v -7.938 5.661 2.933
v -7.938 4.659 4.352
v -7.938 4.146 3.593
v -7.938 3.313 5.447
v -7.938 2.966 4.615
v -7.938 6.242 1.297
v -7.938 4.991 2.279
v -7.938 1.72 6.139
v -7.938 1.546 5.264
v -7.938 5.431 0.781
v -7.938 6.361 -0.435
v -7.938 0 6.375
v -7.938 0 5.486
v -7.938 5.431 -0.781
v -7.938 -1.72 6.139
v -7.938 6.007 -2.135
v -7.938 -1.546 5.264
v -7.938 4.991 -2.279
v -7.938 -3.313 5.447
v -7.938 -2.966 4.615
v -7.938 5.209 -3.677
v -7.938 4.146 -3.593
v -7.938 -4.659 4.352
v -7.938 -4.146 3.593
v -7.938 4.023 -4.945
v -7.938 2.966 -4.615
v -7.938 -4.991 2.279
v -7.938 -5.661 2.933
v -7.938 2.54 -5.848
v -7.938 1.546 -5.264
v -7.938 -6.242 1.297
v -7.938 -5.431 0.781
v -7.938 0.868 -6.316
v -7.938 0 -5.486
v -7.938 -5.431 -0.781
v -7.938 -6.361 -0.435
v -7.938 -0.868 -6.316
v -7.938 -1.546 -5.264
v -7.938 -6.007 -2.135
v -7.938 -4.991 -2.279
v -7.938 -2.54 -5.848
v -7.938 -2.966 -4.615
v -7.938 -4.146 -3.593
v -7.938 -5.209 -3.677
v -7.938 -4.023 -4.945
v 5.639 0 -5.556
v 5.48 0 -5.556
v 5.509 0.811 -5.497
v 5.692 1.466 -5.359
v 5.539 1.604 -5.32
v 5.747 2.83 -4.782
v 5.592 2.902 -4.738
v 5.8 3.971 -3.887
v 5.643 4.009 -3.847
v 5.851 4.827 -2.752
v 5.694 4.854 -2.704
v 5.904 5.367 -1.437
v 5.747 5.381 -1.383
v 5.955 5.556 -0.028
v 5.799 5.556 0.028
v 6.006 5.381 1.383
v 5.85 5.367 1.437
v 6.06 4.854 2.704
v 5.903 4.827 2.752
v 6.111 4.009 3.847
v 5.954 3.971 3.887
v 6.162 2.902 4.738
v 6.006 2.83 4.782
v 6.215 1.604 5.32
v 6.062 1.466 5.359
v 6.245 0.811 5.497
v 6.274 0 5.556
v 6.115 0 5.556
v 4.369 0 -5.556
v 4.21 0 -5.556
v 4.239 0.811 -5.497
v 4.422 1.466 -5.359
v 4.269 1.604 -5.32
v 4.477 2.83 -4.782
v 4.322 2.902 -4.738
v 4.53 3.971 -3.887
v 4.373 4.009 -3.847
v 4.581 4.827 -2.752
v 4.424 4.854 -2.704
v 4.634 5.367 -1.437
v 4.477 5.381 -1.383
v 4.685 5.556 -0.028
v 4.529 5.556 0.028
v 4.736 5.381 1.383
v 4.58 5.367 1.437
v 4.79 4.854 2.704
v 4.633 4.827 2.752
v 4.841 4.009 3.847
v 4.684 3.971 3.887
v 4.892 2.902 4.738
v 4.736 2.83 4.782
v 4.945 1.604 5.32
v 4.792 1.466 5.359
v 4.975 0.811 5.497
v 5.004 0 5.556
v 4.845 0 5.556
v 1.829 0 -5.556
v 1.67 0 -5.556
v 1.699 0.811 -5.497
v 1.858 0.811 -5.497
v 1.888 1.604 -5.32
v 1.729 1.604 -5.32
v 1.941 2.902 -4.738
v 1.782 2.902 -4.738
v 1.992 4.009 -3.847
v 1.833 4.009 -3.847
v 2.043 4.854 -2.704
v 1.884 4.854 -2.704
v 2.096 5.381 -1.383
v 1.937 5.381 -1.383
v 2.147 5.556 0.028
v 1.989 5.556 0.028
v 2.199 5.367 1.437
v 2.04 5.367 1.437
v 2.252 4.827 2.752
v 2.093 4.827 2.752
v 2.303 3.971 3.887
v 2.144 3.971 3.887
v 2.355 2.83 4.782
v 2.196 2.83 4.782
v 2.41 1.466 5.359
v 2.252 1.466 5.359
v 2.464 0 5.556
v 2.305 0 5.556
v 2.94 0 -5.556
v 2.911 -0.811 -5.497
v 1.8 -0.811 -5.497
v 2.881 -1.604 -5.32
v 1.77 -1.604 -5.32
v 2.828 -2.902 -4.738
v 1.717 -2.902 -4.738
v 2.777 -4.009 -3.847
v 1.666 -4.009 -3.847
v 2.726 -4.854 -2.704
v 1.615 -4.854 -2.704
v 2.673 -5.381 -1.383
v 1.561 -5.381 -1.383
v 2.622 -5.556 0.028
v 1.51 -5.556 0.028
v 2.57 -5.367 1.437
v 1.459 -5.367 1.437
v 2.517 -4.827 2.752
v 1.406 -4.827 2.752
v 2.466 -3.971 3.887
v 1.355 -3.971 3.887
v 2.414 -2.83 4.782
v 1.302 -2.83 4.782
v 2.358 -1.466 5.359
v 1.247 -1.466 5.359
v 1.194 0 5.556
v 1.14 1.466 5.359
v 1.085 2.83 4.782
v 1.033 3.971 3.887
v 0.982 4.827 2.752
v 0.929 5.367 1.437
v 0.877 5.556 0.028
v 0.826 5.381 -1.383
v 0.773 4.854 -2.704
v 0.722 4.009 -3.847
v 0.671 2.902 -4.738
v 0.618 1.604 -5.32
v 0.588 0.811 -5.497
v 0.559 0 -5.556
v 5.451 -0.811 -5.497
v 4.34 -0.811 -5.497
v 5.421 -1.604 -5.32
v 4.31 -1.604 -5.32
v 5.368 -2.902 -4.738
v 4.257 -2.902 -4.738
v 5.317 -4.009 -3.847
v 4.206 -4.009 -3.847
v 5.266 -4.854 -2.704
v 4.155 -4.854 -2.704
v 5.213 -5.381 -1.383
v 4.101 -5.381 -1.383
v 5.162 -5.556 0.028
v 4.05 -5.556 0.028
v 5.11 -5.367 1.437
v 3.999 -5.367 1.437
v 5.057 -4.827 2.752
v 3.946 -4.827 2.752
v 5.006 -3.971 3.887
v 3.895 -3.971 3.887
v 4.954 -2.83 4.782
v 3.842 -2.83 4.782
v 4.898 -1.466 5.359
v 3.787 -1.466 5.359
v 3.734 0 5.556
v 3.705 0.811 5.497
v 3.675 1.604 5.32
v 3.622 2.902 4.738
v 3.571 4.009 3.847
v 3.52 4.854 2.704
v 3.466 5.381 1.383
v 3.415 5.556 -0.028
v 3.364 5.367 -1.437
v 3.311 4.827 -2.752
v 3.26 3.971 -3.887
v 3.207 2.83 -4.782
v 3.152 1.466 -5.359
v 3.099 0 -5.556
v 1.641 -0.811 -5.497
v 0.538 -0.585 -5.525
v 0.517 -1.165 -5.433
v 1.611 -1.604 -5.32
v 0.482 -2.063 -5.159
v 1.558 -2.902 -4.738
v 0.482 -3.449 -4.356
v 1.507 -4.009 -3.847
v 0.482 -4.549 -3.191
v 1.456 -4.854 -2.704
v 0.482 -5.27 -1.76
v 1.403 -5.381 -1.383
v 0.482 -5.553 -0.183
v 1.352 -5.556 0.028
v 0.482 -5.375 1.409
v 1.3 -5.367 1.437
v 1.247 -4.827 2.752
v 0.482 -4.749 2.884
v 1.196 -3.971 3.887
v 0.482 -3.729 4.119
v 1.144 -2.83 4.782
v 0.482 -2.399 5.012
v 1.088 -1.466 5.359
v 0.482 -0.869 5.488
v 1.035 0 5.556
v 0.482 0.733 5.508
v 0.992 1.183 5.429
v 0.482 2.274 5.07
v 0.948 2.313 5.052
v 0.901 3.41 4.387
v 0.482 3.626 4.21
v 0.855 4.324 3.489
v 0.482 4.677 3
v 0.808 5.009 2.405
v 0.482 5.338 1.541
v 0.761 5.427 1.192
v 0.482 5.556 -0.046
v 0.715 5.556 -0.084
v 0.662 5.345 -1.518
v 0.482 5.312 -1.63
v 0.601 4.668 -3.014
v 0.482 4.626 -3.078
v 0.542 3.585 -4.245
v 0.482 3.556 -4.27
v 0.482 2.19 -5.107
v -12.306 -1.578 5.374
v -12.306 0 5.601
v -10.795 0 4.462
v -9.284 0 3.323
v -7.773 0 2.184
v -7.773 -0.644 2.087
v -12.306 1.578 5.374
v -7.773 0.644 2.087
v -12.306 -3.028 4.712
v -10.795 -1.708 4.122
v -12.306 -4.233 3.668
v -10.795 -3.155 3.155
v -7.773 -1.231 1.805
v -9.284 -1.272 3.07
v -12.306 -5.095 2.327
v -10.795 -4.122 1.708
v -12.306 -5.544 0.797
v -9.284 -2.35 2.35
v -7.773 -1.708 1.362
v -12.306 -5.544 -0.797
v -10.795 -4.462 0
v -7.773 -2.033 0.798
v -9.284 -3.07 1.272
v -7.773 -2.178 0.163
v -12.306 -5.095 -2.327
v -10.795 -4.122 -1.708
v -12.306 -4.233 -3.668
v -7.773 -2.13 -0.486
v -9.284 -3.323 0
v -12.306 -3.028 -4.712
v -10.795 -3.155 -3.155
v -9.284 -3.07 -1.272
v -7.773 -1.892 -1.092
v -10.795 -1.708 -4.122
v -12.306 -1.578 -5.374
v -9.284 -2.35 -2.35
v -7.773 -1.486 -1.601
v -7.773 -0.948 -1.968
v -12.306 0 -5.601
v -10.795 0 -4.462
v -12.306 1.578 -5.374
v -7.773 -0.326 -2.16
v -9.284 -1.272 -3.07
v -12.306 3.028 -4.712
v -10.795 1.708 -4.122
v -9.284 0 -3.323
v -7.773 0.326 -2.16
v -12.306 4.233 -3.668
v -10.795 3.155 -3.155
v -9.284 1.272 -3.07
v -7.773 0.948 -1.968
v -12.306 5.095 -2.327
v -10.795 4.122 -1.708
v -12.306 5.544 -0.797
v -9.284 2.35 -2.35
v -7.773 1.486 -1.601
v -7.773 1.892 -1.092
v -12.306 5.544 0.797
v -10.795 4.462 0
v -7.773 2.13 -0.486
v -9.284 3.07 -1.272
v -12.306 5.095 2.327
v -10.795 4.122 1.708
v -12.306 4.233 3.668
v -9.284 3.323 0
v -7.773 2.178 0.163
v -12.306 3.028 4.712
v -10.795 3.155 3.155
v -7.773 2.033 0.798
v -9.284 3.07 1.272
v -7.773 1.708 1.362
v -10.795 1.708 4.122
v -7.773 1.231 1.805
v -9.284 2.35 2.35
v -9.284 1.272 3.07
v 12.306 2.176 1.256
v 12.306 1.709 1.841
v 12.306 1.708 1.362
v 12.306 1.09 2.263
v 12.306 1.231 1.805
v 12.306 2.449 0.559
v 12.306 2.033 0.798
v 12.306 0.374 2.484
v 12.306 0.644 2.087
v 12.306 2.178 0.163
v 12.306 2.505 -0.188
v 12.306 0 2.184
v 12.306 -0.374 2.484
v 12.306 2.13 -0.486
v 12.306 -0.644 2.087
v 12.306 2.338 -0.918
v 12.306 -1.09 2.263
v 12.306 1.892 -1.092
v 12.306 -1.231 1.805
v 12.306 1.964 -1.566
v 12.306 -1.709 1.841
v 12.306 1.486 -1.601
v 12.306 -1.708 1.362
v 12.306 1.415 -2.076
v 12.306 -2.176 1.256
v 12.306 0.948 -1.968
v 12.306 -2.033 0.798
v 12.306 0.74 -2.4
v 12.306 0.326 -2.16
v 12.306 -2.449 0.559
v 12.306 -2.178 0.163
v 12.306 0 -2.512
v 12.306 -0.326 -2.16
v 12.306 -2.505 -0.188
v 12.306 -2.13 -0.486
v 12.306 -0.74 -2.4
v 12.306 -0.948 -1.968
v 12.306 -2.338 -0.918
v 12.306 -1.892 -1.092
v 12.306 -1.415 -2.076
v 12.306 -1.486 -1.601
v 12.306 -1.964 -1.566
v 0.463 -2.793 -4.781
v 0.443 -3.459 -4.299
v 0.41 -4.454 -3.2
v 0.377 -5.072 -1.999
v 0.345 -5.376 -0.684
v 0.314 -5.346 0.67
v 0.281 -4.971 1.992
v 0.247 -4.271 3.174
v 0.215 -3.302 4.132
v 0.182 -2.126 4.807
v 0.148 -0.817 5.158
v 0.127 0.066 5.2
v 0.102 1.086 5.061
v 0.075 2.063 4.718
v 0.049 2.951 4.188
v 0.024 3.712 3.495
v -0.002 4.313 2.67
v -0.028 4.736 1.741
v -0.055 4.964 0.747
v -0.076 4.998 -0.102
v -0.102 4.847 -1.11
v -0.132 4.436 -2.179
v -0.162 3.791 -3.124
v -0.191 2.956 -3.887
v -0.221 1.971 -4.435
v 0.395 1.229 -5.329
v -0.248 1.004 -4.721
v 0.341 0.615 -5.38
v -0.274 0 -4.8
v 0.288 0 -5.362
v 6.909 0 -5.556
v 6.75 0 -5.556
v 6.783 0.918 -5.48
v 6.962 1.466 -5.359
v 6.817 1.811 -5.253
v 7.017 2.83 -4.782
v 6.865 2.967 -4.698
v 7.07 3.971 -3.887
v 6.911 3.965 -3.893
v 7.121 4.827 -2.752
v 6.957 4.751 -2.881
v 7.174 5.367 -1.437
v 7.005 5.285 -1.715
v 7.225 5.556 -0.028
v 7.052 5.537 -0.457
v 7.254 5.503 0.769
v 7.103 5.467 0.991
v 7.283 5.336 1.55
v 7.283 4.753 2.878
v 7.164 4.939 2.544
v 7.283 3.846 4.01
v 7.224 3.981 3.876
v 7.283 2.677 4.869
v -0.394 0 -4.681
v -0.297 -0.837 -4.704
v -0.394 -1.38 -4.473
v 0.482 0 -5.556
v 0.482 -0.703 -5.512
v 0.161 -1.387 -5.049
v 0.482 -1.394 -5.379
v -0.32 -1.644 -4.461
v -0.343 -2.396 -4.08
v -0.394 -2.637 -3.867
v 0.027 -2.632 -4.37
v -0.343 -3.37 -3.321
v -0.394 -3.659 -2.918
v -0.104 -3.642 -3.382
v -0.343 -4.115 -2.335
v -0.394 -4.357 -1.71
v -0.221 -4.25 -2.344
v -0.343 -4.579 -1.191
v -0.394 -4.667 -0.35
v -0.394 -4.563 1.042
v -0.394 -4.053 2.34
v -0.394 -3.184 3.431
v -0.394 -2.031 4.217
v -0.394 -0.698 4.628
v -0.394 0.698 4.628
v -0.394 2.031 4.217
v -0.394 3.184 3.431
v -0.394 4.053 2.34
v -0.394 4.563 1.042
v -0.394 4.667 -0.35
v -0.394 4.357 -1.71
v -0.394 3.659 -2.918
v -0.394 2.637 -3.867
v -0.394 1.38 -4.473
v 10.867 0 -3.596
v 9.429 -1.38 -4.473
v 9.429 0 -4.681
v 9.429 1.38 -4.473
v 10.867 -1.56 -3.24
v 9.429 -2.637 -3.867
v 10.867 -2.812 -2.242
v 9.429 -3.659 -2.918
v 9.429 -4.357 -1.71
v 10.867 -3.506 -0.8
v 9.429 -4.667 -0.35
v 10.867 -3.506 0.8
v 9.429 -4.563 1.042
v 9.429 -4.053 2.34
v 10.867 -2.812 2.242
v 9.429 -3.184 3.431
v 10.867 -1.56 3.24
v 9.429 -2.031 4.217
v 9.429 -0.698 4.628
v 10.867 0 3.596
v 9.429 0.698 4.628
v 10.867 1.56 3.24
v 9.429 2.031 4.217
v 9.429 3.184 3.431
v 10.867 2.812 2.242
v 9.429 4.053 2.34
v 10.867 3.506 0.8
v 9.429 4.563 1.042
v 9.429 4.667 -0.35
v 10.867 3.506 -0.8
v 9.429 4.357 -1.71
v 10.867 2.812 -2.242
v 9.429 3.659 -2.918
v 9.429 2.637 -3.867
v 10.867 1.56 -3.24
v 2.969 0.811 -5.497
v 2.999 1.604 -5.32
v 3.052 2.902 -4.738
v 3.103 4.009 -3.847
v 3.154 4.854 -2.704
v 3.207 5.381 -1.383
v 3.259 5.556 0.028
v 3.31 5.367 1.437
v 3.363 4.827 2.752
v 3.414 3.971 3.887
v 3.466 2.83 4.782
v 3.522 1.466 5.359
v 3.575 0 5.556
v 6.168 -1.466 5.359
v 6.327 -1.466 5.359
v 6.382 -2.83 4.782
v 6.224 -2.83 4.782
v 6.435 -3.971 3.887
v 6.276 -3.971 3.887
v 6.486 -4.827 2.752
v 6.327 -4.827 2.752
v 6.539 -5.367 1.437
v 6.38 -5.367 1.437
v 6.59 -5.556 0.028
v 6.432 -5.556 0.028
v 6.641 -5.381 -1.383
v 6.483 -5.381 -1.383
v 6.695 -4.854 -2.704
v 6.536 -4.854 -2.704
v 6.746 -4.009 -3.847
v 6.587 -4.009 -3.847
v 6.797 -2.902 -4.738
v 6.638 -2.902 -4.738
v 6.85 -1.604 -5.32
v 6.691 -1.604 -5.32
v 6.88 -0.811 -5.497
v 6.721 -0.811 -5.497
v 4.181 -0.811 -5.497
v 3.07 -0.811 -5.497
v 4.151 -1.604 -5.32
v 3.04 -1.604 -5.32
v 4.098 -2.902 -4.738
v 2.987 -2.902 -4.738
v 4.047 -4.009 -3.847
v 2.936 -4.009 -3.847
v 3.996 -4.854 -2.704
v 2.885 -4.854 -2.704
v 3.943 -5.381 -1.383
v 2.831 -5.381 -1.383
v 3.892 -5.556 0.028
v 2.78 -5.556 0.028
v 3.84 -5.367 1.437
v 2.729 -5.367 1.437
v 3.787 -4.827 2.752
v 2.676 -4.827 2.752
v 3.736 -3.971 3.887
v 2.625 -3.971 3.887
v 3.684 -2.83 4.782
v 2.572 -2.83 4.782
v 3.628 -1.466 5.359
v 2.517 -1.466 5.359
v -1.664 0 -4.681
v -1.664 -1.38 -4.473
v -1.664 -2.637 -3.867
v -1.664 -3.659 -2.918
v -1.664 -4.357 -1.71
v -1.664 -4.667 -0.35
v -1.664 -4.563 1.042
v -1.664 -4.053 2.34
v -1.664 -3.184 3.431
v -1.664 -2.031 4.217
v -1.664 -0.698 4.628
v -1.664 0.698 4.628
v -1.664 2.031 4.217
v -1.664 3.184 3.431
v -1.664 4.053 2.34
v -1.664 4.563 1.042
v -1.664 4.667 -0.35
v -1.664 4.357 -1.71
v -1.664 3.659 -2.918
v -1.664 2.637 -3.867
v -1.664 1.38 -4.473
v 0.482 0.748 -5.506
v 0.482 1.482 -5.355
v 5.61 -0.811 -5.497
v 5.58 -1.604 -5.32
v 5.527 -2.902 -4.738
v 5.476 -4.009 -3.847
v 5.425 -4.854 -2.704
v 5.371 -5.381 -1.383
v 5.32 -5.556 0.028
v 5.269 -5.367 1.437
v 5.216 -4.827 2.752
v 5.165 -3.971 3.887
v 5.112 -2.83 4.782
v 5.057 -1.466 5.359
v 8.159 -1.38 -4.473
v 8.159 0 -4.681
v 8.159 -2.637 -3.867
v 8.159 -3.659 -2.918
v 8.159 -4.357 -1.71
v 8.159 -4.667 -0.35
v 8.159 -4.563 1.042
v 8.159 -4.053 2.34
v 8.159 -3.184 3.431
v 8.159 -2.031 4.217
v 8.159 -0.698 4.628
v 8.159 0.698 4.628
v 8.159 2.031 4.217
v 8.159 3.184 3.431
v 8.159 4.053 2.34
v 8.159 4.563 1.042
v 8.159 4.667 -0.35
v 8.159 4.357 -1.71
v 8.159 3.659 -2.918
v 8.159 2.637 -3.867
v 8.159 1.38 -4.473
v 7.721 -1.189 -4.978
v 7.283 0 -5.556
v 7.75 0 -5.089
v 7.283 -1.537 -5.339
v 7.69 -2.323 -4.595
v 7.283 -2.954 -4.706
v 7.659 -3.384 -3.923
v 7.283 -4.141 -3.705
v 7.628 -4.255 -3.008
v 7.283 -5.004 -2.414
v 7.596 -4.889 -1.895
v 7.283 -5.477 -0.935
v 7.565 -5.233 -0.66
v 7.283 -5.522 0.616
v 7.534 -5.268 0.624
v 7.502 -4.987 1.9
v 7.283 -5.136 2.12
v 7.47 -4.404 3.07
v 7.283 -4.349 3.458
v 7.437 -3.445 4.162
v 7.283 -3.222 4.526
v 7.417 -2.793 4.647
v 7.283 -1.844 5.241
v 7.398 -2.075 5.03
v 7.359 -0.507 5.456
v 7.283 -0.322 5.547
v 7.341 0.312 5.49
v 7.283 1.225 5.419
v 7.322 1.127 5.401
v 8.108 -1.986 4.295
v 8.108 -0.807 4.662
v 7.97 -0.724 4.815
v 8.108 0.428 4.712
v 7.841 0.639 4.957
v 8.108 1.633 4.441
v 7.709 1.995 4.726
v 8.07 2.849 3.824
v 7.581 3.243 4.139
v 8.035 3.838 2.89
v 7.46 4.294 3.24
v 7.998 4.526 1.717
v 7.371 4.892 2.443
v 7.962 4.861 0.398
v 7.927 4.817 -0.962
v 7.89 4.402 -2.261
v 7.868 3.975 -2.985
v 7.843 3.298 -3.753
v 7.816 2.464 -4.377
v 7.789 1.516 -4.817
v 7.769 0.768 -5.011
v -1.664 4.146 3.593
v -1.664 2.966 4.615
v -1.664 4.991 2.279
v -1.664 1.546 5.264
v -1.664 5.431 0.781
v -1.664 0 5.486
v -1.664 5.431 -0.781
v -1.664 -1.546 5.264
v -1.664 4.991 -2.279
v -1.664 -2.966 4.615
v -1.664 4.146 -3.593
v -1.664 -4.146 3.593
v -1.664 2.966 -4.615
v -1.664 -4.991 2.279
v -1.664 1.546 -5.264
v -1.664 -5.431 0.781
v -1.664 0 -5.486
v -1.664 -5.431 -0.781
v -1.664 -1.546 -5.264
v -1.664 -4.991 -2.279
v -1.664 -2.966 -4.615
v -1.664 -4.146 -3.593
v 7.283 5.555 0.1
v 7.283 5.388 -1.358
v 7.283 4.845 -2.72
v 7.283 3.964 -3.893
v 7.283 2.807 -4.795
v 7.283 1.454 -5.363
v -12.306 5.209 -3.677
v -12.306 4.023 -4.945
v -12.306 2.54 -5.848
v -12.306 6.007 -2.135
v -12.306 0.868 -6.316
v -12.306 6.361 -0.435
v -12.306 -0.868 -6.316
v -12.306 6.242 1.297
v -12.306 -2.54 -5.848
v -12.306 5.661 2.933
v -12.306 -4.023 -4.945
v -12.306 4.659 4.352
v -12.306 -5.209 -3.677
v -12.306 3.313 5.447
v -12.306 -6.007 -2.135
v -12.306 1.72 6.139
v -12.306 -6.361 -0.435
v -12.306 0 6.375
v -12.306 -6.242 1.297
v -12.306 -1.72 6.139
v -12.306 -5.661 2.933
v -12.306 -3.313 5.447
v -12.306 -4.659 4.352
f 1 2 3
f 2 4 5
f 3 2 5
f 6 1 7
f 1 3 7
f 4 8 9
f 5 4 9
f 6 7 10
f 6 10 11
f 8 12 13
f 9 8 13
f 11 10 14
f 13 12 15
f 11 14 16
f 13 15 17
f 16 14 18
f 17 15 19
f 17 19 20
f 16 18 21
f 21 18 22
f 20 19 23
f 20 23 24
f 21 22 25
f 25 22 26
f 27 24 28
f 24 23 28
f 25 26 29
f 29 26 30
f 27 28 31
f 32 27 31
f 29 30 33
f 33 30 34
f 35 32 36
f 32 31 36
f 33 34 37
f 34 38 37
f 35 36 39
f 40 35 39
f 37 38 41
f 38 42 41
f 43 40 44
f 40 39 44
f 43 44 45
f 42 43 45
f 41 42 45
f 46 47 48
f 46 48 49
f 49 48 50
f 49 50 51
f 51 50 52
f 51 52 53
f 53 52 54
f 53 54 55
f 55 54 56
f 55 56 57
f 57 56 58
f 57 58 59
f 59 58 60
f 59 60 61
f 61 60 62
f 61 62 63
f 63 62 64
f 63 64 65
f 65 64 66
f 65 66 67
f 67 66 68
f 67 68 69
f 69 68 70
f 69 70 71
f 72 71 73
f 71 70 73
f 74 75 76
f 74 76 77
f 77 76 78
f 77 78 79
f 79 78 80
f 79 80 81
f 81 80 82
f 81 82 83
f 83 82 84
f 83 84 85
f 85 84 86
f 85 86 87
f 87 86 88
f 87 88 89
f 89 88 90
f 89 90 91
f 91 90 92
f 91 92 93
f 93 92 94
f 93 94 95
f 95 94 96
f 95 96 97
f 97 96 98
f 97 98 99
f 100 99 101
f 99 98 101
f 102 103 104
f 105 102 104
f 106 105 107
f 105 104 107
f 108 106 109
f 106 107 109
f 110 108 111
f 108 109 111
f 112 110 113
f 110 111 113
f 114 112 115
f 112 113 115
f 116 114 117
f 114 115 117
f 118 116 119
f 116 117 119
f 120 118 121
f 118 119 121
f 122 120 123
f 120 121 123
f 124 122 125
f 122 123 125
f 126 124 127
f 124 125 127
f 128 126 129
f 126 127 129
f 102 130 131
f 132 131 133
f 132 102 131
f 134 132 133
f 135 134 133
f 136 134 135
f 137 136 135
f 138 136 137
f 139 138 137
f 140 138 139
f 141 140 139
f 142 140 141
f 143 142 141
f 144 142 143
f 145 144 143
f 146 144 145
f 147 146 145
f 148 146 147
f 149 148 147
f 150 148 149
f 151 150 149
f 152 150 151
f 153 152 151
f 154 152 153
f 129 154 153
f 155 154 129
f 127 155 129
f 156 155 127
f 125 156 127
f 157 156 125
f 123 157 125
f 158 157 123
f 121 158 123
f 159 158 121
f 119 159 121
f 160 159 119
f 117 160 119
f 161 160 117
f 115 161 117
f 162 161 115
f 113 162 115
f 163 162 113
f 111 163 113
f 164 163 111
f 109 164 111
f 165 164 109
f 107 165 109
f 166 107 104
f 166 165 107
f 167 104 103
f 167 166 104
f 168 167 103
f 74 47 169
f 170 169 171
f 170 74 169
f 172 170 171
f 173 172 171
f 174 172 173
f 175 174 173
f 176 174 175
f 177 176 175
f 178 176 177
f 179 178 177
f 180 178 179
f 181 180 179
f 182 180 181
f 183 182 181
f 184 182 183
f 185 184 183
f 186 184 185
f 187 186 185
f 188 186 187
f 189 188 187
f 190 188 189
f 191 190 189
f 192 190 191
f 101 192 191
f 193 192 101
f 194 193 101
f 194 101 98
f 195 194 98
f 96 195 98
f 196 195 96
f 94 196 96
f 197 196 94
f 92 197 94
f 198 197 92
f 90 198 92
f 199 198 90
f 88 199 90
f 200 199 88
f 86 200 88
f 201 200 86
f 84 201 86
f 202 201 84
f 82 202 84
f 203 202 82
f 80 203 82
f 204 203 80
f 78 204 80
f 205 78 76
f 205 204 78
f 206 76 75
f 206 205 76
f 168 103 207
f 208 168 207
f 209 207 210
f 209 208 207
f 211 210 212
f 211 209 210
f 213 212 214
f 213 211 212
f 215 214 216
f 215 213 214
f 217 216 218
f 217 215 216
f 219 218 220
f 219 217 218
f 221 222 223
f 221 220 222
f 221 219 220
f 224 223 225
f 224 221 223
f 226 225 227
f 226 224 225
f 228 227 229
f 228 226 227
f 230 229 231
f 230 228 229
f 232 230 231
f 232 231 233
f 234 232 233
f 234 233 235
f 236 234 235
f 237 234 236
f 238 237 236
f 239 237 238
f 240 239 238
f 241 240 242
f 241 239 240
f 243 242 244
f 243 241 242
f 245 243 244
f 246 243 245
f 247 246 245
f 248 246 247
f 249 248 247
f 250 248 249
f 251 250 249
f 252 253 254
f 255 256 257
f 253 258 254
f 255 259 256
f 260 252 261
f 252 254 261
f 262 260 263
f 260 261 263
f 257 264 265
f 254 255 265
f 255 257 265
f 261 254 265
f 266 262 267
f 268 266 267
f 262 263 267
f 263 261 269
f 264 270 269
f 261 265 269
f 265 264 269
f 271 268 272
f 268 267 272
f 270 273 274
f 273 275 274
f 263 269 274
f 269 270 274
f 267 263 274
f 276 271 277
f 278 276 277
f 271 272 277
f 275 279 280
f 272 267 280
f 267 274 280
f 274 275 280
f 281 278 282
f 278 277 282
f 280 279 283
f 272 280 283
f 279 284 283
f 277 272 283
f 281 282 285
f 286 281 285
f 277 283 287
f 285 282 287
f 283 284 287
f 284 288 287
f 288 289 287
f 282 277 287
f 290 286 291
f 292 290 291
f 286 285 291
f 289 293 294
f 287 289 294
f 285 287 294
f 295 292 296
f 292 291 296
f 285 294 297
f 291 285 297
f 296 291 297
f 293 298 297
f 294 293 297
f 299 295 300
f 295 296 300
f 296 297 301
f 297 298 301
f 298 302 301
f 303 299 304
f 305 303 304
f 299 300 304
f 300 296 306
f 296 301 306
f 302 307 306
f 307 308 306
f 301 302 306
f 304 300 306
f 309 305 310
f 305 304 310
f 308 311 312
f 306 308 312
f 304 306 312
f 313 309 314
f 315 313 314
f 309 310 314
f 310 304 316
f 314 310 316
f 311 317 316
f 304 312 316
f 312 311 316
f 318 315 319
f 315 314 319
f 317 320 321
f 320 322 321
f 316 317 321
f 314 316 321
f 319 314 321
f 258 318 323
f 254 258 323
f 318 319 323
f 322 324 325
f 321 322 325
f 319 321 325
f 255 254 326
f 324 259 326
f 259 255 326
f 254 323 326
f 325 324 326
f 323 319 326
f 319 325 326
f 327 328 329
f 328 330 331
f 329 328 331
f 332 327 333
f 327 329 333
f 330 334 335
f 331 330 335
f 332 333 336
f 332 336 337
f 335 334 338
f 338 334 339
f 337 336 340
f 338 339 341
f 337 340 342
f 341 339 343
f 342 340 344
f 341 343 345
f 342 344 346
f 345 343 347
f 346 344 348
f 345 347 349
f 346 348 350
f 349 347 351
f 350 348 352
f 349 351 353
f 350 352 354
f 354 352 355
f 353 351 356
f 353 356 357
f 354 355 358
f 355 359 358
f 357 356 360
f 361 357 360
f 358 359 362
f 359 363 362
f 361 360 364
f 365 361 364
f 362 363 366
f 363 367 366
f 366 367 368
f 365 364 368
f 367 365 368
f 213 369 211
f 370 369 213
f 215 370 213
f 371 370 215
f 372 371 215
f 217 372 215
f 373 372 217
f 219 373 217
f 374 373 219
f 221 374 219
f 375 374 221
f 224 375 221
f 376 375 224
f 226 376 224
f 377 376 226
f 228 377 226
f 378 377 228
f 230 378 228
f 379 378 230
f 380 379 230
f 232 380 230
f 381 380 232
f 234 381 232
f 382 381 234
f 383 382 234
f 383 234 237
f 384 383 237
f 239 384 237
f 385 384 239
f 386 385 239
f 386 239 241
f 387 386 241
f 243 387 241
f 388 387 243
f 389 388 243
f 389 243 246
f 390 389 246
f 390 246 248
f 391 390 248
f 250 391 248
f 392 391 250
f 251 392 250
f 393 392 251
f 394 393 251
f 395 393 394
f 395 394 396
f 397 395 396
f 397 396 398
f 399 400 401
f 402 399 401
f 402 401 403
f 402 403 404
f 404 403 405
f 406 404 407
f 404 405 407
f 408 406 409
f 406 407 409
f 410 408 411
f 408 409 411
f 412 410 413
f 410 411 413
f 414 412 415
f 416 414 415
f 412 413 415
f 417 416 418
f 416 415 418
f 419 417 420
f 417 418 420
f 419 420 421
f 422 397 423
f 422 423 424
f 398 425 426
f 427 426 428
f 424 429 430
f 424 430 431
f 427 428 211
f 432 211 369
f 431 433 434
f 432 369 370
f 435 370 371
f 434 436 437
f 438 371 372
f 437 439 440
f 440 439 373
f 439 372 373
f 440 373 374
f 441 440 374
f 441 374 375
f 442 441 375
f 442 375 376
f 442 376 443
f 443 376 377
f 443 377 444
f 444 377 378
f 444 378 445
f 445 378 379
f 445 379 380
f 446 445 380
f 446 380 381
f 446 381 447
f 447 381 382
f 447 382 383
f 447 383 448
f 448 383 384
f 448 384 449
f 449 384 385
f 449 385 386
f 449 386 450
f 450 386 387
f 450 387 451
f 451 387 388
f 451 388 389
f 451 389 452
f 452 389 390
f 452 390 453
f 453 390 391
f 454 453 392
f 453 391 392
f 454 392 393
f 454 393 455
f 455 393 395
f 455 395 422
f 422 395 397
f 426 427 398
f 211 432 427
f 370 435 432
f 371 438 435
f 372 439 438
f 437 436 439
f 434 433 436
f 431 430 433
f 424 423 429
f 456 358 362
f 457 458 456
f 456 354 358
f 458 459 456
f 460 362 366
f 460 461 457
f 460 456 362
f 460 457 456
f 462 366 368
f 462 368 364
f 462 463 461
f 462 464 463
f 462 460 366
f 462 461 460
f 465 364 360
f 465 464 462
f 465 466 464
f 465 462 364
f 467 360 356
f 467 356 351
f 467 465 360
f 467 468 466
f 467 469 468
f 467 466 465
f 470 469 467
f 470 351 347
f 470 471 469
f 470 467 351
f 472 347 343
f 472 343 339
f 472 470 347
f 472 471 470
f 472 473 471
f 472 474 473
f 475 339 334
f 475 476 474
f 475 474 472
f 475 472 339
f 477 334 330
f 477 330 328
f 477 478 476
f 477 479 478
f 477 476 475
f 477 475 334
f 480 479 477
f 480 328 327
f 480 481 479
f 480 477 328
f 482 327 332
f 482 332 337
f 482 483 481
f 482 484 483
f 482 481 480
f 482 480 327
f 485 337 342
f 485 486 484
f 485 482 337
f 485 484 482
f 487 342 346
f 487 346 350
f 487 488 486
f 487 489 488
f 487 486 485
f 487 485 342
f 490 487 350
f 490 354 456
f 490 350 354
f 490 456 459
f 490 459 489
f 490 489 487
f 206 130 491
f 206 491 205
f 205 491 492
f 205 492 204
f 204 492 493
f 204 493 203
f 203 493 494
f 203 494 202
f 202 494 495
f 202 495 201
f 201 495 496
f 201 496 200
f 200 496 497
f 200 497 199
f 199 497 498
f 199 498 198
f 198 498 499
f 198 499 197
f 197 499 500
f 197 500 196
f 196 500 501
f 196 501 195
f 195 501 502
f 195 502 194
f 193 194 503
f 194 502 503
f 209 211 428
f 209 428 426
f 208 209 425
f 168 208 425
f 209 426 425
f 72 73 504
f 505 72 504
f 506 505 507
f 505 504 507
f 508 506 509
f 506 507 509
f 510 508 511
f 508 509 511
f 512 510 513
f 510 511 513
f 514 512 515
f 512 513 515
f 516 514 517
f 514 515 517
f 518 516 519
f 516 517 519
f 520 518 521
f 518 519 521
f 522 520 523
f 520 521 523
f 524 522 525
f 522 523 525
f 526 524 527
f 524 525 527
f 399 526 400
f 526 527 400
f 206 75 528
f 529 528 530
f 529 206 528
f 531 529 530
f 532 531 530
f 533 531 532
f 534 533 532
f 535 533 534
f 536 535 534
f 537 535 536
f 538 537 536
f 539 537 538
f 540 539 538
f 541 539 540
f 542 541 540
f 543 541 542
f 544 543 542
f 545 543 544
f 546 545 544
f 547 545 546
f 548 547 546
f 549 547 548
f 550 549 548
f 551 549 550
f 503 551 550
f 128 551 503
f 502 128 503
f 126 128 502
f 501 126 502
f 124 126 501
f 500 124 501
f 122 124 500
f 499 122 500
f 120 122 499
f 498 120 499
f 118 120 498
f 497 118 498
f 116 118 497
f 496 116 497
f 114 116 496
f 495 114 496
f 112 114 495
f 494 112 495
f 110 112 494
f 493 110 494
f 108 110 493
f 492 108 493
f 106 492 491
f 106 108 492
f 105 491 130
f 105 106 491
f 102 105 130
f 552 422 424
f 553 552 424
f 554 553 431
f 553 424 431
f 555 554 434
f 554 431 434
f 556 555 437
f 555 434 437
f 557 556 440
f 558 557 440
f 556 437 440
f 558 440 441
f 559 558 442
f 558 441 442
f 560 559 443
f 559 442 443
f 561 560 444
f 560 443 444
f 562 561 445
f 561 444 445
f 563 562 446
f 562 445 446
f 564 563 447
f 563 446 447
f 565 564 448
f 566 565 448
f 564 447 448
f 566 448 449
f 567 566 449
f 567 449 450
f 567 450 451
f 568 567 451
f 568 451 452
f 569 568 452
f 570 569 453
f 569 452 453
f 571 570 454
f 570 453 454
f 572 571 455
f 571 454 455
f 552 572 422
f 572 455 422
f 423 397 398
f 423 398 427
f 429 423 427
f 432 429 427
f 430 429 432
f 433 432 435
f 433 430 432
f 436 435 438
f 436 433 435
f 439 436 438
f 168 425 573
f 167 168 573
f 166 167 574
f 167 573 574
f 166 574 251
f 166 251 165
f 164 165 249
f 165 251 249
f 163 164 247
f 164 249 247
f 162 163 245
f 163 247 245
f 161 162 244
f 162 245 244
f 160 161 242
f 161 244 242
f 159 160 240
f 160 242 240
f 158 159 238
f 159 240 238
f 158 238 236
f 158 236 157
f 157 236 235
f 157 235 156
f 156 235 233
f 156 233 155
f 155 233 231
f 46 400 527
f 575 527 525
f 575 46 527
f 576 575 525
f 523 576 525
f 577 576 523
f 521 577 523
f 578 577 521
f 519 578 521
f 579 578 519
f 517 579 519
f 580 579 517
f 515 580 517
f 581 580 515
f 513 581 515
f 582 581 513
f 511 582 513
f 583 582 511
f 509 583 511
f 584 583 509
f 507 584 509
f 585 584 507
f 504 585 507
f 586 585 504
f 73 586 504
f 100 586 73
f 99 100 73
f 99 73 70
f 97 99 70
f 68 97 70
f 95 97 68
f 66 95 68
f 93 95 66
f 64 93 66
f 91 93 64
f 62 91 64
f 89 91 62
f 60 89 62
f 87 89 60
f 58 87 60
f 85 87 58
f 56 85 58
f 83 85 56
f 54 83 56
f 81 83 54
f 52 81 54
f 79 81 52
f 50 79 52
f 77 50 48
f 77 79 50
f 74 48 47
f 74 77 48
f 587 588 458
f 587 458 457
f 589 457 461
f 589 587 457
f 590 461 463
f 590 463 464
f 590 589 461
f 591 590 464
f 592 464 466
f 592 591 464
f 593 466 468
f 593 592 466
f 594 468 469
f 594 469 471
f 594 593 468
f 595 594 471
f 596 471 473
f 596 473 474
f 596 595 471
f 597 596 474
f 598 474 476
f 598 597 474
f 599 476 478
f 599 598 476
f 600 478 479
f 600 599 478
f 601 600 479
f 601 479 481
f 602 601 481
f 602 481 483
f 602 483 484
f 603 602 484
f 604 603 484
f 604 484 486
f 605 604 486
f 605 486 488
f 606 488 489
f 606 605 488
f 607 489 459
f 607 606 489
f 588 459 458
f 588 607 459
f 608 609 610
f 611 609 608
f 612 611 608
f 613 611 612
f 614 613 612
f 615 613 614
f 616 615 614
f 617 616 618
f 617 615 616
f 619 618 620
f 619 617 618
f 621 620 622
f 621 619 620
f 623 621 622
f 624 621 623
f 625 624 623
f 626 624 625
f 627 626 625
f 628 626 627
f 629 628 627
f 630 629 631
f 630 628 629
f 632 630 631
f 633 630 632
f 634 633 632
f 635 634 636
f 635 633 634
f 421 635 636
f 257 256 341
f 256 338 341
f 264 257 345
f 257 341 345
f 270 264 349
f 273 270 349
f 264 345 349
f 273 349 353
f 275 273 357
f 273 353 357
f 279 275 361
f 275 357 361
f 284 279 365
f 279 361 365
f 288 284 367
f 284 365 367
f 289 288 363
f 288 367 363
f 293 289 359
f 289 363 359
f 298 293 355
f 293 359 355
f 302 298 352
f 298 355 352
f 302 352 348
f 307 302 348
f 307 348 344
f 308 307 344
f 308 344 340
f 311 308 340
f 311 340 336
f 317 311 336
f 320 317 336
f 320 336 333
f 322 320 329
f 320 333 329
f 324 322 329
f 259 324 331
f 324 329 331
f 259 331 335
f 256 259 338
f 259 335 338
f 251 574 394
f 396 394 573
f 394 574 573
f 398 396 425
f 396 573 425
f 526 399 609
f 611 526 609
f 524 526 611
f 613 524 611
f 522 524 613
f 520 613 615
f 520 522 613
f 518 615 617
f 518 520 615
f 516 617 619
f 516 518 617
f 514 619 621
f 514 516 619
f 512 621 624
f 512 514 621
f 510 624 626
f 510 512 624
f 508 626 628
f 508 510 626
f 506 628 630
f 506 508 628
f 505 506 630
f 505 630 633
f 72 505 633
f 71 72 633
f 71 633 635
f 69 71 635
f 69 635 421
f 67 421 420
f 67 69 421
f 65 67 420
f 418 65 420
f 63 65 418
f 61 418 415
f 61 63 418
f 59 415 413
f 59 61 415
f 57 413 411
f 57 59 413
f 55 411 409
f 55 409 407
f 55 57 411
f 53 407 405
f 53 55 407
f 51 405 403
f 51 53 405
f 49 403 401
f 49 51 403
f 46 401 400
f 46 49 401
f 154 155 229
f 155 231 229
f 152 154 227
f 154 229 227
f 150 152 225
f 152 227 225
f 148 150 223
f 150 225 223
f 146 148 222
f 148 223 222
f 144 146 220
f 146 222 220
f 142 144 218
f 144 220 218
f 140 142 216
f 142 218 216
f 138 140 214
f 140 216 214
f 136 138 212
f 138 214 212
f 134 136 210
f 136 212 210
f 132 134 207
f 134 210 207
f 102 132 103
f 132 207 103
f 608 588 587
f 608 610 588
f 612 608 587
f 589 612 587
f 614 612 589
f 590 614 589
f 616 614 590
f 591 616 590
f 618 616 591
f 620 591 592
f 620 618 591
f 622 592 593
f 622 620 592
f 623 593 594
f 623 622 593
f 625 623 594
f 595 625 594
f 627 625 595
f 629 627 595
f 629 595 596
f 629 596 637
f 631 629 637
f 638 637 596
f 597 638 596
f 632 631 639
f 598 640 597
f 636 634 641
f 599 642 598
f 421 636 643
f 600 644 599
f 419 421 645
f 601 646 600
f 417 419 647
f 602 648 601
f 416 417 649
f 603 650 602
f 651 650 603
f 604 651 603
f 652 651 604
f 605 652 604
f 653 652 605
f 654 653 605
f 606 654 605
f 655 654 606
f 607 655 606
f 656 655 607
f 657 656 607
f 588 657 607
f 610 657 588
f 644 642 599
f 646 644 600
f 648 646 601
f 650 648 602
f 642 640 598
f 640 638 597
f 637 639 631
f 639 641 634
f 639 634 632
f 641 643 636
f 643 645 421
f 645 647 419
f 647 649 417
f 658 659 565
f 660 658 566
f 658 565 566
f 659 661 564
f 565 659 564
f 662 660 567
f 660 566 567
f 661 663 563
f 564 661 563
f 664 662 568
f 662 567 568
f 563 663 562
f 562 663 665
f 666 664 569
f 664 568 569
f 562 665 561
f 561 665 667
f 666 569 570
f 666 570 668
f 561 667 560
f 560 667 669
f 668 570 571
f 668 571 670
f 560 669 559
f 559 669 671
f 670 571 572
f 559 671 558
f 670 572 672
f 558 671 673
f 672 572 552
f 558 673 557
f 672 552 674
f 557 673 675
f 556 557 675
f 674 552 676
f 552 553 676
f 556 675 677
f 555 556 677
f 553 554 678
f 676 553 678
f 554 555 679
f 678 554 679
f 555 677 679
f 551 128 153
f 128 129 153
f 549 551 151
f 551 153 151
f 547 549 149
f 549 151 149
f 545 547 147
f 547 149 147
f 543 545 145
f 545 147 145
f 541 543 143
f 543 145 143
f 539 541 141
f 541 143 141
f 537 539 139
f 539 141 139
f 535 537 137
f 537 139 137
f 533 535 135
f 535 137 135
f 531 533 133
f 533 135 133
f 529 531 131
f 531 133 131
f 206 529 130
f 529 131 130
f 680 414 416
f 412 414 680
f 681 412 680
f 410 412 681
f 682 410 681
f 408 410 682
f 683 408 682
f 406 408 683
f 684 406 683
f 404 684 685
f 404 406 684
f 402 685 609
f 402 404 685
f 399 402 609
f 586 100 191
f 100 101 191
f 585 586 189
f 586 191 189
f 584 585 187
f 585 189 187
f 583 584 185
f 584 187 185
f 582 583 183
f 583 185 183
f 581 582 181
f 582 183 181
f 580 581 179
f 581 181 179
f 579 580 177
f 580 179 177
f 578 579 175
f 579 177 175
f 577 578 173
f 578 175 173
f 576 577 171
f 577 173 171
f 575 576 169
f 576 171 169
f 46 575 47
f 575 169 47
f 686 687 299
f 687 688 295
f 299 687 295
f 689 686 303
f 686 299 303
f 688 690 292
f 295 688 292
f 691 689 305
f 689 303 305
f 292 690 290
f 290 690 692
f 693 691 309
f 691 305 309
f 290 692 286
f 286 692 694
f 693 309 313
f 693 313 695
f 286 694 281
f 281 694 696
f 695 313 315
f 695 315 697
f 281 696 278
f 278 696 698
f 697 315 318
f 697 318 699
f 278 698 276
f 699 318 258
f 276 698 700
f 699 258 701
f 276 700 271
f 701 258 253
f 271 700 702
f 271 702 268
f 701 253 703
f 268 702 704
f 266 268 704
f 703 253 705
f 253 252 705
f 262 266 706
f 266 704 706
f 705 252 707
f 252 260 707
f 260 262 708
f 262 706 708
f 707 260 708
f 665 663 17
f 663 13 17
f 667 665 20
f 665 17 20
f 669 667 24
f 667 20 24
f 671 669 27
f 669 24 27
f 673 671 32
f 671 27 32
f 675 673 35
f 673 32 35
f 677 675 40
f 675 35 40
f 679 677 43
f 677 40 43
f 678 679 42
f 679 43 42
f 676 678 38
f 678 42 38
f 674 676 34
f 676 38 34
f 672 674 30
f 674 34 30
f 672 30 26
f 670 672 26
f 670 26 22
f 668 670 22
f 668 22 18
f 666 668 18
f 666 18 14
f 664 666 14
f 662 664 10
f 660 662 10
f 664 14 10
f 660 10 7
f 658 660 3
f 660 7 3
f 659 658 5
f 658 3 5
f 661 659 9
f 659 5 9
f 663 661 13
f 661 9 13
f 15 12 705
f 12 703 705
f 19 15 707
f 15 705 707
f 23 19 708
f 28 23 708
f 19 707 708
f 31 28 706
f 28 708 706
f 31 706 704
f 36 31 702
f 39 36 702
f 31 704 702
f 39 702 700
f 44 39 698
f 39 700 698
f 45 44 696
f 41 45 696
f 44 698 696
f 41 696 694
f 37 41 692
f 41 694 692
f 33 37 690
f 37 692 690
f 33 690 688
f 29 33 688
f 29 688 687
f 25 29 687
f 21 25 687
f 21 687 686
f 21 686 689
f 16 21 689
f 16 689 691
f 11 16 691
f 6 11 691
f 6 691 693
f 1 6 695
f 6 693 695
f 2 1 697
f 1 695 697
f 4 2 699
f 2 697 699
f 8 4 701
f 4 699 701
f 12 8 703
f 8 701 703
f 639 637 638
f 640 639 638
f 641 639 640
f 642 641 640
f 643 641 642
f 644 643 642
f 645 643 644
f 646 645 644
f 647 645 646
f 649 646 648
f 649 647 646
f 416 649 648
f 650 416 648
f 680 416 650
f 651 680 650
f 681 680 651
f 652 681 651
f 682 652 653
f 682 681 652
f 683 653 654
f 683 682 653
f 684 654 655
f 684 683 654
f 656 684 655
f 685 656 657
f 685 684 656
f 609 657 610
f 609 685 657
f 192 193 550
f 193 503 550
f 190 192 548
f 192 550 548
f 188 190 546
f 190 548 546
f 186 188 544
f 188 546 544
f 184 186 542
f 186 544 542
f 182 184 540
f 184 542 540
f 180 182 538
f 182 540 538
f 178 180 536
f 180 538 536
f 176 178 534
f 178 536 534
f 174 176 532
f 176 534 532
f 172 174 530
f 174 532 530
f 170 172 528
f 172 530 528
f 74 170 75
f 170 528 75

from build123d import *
from build123d.topology import SkipClean

# Parameters (mm, degrees)
CUT_SWEEP1_PITCH = 1.27


with BuildPart() as part:
    # Sketch1 → Revolve1 (revolve)
    with BuildSketch(Plane.XY, mode=Mode.PRIVATE) as revolve1_sk:
        Polygon((-12.3063, 6.3754), (-12.3063, 5.6007), (-7.772716776, 2.1844), (12.3063, 2.1844), (12.3063, 2.51206), (12.3063, 5.55625), (8.266523424, 5.55625), (-1.6637, 5.55625), (-1.6637, 5.4864), (-7.9375, 5.4864), (-7.9375, 6.3754), align=None)
    revolve(revolve1_sk.sketch.rotate(Axis((-12.3063, 0, 0), (1, 0, 0)), 90), axis=Axis((-12.3063, 0, 0), (1, 0, 0)))

    # Cut-Sweep1: the profile of Sketch4 profile screwed along a right-hand helix of 11 turns, 8 arcs to a turn; built about Z, then put on its axis
    cut_sweep1_z = Axis((0, 0, 0), (0, 0, 1))
    cut_sweep1_corners = [(5.55655, 0, 0.000173205), (5.55655, 0, -1.111423205), (4.731360803, 0, -0.635), (4.731360803, 0, -0.47625)]
    with BuildLine(mode=Mode.PRIVATE) as cut_sweep1_profile:
        Line(cut_sweep1_corners[0], cut_sweep1_corners[1])
        Line(cut_sweep1_corners[1], cut_sweep1_corners[2])
        Line(cut_sweep1_corners[2], cut_sweep1_corners[3])
        Line(cut_sweep1_corners[3], cut_sweep1_corners[0])
    cut_sweep1_cap = Face(cut_sweep1_profile.wire())
    cut_sweep1_turn_angles = [0, 22.5, 45, 67.5, 90, 112.5, 135, 157.5, 180, 202.5, 225, 247.5, 270, 292.5, 315, 337.5, 360]
    cut_sweep1_turn_weights = [1, 0.9238795325112867, 1, 0.9238795325112867, 1, 0.9238795325112867, 1, 0.9238795325112867, 1, 0.9238795325112867, 1, 0.9238795325112867, 1, 0.9238795325112867, 1, 0.9238795325112867, 1]
    cut_sweep1_turn_rails = [Edge.make_bspline([Vector(p[0], p[1], 0).rotate(cut_sweep1_z, cut_sweep1_turn_angles[k]) / cut_sweep1_turn_weights[k] + Vector(0, 0, p[2] + CUT_SWEEP1_PITCH * cut_sweep1_turn_angles[k] / 360) for k in range(17)], [0, 0, 0, 1, 1, 2, 2, 3, 3, 4, 4, 5, 5, 6, 6, 7, 7, 8, 8, 8], 2, cut_sweep1_turn_weights) for p in cut_sweep1_corners]
    cut_sweep1_turn_sides = [Face.make_surface_from_curves(cut_sweep1_turn_rails[p[0]], cut_sweep1_turn_rails[p[1]]) for p in [(0, 1), (1, 2), (2, 3), (3, 0)]]
    cut_sweep1_turn = Solid(Shell([*cut_sweep1_turn_sides, cut_sweep1_cap, cut_sweep1_cap.rotate(cut_sweep1_z, 360).moved(Location((0, 0, CUT_SWEEP1_PITCH * 360 / 360)))]))
    cut_sweep1_each = [*[cut_sweep1_turn.moved(Location((0, 0, CUT_SWEEP1_PITCH * i))) for i in range(11)]]
    add(Plane(origin=(12.3063, 0, 0), x_dir=(0, 1, 0), z_dir=(-1, 0, 0)) * Compound([cut_sweep1_each[i] for i in range(0, 11, 2)]), mode=Mode.SUBTRACT)
    add(Plane(origin=(12.3063, 0, 0), x_dir=(0, 1, 0), z_dir=(-1, 0, 0)) * Compound([cut_sweep1_each[i] for i in range(1, 11, 2)]), mode=Mode.SUBTRACT)

    # Sketch5 → Cut-Revolve1 (revolve, cut)
    with BuildSketch(Plane.XY, mode=Mode.PRIVATE) as cut_revolve1_sk:
        Polygon((12.3063, 2.51206), (9.428602239, 4.680560803), (8.158602239, 4.680560803), (7.282913042, 5.55625), (12.3063, 5.55625), align=None)
        Polygon((-1.6637, 5.55625), (-1.6637, 4.680560803), (-0.3937, 4.680560803), (0.481989197, 5.55625), align=None)
    revolve(cut_revolve1_sk.sketch.rotate(Axis((0, 0, 0), (-1, 0, 0)), 90), axis=Axis((0, 0, 0), (-1, 0, 0)), mode=Mode.SUBTRACT)

    # Sketch6 → Revolve2 (revolve)
    with SkipClean():  # the faces are left unmerged after this step: merging them gives an invalid solid
        with BuildSketch(Plane.XY, mode=Mode.PRIVATE) as revolve2_sk:
            Polygon((-0.3937, 4.680560803), (8.158602239, 4.680560803), (7.282913042, 5.55625), (0.481989197, 5.55625), align=None)
        revolve(revolve2_sk.sketch.rotate(Axis((0, 0, 0), (-1, 0, 0)), 90), axis=Axis((0, 0, 0), (-1, 0, 0)))
    add(part.part.scale(1), mode=Mode.REPLACE)  # the faces are merged on a copy


solid = part.part
